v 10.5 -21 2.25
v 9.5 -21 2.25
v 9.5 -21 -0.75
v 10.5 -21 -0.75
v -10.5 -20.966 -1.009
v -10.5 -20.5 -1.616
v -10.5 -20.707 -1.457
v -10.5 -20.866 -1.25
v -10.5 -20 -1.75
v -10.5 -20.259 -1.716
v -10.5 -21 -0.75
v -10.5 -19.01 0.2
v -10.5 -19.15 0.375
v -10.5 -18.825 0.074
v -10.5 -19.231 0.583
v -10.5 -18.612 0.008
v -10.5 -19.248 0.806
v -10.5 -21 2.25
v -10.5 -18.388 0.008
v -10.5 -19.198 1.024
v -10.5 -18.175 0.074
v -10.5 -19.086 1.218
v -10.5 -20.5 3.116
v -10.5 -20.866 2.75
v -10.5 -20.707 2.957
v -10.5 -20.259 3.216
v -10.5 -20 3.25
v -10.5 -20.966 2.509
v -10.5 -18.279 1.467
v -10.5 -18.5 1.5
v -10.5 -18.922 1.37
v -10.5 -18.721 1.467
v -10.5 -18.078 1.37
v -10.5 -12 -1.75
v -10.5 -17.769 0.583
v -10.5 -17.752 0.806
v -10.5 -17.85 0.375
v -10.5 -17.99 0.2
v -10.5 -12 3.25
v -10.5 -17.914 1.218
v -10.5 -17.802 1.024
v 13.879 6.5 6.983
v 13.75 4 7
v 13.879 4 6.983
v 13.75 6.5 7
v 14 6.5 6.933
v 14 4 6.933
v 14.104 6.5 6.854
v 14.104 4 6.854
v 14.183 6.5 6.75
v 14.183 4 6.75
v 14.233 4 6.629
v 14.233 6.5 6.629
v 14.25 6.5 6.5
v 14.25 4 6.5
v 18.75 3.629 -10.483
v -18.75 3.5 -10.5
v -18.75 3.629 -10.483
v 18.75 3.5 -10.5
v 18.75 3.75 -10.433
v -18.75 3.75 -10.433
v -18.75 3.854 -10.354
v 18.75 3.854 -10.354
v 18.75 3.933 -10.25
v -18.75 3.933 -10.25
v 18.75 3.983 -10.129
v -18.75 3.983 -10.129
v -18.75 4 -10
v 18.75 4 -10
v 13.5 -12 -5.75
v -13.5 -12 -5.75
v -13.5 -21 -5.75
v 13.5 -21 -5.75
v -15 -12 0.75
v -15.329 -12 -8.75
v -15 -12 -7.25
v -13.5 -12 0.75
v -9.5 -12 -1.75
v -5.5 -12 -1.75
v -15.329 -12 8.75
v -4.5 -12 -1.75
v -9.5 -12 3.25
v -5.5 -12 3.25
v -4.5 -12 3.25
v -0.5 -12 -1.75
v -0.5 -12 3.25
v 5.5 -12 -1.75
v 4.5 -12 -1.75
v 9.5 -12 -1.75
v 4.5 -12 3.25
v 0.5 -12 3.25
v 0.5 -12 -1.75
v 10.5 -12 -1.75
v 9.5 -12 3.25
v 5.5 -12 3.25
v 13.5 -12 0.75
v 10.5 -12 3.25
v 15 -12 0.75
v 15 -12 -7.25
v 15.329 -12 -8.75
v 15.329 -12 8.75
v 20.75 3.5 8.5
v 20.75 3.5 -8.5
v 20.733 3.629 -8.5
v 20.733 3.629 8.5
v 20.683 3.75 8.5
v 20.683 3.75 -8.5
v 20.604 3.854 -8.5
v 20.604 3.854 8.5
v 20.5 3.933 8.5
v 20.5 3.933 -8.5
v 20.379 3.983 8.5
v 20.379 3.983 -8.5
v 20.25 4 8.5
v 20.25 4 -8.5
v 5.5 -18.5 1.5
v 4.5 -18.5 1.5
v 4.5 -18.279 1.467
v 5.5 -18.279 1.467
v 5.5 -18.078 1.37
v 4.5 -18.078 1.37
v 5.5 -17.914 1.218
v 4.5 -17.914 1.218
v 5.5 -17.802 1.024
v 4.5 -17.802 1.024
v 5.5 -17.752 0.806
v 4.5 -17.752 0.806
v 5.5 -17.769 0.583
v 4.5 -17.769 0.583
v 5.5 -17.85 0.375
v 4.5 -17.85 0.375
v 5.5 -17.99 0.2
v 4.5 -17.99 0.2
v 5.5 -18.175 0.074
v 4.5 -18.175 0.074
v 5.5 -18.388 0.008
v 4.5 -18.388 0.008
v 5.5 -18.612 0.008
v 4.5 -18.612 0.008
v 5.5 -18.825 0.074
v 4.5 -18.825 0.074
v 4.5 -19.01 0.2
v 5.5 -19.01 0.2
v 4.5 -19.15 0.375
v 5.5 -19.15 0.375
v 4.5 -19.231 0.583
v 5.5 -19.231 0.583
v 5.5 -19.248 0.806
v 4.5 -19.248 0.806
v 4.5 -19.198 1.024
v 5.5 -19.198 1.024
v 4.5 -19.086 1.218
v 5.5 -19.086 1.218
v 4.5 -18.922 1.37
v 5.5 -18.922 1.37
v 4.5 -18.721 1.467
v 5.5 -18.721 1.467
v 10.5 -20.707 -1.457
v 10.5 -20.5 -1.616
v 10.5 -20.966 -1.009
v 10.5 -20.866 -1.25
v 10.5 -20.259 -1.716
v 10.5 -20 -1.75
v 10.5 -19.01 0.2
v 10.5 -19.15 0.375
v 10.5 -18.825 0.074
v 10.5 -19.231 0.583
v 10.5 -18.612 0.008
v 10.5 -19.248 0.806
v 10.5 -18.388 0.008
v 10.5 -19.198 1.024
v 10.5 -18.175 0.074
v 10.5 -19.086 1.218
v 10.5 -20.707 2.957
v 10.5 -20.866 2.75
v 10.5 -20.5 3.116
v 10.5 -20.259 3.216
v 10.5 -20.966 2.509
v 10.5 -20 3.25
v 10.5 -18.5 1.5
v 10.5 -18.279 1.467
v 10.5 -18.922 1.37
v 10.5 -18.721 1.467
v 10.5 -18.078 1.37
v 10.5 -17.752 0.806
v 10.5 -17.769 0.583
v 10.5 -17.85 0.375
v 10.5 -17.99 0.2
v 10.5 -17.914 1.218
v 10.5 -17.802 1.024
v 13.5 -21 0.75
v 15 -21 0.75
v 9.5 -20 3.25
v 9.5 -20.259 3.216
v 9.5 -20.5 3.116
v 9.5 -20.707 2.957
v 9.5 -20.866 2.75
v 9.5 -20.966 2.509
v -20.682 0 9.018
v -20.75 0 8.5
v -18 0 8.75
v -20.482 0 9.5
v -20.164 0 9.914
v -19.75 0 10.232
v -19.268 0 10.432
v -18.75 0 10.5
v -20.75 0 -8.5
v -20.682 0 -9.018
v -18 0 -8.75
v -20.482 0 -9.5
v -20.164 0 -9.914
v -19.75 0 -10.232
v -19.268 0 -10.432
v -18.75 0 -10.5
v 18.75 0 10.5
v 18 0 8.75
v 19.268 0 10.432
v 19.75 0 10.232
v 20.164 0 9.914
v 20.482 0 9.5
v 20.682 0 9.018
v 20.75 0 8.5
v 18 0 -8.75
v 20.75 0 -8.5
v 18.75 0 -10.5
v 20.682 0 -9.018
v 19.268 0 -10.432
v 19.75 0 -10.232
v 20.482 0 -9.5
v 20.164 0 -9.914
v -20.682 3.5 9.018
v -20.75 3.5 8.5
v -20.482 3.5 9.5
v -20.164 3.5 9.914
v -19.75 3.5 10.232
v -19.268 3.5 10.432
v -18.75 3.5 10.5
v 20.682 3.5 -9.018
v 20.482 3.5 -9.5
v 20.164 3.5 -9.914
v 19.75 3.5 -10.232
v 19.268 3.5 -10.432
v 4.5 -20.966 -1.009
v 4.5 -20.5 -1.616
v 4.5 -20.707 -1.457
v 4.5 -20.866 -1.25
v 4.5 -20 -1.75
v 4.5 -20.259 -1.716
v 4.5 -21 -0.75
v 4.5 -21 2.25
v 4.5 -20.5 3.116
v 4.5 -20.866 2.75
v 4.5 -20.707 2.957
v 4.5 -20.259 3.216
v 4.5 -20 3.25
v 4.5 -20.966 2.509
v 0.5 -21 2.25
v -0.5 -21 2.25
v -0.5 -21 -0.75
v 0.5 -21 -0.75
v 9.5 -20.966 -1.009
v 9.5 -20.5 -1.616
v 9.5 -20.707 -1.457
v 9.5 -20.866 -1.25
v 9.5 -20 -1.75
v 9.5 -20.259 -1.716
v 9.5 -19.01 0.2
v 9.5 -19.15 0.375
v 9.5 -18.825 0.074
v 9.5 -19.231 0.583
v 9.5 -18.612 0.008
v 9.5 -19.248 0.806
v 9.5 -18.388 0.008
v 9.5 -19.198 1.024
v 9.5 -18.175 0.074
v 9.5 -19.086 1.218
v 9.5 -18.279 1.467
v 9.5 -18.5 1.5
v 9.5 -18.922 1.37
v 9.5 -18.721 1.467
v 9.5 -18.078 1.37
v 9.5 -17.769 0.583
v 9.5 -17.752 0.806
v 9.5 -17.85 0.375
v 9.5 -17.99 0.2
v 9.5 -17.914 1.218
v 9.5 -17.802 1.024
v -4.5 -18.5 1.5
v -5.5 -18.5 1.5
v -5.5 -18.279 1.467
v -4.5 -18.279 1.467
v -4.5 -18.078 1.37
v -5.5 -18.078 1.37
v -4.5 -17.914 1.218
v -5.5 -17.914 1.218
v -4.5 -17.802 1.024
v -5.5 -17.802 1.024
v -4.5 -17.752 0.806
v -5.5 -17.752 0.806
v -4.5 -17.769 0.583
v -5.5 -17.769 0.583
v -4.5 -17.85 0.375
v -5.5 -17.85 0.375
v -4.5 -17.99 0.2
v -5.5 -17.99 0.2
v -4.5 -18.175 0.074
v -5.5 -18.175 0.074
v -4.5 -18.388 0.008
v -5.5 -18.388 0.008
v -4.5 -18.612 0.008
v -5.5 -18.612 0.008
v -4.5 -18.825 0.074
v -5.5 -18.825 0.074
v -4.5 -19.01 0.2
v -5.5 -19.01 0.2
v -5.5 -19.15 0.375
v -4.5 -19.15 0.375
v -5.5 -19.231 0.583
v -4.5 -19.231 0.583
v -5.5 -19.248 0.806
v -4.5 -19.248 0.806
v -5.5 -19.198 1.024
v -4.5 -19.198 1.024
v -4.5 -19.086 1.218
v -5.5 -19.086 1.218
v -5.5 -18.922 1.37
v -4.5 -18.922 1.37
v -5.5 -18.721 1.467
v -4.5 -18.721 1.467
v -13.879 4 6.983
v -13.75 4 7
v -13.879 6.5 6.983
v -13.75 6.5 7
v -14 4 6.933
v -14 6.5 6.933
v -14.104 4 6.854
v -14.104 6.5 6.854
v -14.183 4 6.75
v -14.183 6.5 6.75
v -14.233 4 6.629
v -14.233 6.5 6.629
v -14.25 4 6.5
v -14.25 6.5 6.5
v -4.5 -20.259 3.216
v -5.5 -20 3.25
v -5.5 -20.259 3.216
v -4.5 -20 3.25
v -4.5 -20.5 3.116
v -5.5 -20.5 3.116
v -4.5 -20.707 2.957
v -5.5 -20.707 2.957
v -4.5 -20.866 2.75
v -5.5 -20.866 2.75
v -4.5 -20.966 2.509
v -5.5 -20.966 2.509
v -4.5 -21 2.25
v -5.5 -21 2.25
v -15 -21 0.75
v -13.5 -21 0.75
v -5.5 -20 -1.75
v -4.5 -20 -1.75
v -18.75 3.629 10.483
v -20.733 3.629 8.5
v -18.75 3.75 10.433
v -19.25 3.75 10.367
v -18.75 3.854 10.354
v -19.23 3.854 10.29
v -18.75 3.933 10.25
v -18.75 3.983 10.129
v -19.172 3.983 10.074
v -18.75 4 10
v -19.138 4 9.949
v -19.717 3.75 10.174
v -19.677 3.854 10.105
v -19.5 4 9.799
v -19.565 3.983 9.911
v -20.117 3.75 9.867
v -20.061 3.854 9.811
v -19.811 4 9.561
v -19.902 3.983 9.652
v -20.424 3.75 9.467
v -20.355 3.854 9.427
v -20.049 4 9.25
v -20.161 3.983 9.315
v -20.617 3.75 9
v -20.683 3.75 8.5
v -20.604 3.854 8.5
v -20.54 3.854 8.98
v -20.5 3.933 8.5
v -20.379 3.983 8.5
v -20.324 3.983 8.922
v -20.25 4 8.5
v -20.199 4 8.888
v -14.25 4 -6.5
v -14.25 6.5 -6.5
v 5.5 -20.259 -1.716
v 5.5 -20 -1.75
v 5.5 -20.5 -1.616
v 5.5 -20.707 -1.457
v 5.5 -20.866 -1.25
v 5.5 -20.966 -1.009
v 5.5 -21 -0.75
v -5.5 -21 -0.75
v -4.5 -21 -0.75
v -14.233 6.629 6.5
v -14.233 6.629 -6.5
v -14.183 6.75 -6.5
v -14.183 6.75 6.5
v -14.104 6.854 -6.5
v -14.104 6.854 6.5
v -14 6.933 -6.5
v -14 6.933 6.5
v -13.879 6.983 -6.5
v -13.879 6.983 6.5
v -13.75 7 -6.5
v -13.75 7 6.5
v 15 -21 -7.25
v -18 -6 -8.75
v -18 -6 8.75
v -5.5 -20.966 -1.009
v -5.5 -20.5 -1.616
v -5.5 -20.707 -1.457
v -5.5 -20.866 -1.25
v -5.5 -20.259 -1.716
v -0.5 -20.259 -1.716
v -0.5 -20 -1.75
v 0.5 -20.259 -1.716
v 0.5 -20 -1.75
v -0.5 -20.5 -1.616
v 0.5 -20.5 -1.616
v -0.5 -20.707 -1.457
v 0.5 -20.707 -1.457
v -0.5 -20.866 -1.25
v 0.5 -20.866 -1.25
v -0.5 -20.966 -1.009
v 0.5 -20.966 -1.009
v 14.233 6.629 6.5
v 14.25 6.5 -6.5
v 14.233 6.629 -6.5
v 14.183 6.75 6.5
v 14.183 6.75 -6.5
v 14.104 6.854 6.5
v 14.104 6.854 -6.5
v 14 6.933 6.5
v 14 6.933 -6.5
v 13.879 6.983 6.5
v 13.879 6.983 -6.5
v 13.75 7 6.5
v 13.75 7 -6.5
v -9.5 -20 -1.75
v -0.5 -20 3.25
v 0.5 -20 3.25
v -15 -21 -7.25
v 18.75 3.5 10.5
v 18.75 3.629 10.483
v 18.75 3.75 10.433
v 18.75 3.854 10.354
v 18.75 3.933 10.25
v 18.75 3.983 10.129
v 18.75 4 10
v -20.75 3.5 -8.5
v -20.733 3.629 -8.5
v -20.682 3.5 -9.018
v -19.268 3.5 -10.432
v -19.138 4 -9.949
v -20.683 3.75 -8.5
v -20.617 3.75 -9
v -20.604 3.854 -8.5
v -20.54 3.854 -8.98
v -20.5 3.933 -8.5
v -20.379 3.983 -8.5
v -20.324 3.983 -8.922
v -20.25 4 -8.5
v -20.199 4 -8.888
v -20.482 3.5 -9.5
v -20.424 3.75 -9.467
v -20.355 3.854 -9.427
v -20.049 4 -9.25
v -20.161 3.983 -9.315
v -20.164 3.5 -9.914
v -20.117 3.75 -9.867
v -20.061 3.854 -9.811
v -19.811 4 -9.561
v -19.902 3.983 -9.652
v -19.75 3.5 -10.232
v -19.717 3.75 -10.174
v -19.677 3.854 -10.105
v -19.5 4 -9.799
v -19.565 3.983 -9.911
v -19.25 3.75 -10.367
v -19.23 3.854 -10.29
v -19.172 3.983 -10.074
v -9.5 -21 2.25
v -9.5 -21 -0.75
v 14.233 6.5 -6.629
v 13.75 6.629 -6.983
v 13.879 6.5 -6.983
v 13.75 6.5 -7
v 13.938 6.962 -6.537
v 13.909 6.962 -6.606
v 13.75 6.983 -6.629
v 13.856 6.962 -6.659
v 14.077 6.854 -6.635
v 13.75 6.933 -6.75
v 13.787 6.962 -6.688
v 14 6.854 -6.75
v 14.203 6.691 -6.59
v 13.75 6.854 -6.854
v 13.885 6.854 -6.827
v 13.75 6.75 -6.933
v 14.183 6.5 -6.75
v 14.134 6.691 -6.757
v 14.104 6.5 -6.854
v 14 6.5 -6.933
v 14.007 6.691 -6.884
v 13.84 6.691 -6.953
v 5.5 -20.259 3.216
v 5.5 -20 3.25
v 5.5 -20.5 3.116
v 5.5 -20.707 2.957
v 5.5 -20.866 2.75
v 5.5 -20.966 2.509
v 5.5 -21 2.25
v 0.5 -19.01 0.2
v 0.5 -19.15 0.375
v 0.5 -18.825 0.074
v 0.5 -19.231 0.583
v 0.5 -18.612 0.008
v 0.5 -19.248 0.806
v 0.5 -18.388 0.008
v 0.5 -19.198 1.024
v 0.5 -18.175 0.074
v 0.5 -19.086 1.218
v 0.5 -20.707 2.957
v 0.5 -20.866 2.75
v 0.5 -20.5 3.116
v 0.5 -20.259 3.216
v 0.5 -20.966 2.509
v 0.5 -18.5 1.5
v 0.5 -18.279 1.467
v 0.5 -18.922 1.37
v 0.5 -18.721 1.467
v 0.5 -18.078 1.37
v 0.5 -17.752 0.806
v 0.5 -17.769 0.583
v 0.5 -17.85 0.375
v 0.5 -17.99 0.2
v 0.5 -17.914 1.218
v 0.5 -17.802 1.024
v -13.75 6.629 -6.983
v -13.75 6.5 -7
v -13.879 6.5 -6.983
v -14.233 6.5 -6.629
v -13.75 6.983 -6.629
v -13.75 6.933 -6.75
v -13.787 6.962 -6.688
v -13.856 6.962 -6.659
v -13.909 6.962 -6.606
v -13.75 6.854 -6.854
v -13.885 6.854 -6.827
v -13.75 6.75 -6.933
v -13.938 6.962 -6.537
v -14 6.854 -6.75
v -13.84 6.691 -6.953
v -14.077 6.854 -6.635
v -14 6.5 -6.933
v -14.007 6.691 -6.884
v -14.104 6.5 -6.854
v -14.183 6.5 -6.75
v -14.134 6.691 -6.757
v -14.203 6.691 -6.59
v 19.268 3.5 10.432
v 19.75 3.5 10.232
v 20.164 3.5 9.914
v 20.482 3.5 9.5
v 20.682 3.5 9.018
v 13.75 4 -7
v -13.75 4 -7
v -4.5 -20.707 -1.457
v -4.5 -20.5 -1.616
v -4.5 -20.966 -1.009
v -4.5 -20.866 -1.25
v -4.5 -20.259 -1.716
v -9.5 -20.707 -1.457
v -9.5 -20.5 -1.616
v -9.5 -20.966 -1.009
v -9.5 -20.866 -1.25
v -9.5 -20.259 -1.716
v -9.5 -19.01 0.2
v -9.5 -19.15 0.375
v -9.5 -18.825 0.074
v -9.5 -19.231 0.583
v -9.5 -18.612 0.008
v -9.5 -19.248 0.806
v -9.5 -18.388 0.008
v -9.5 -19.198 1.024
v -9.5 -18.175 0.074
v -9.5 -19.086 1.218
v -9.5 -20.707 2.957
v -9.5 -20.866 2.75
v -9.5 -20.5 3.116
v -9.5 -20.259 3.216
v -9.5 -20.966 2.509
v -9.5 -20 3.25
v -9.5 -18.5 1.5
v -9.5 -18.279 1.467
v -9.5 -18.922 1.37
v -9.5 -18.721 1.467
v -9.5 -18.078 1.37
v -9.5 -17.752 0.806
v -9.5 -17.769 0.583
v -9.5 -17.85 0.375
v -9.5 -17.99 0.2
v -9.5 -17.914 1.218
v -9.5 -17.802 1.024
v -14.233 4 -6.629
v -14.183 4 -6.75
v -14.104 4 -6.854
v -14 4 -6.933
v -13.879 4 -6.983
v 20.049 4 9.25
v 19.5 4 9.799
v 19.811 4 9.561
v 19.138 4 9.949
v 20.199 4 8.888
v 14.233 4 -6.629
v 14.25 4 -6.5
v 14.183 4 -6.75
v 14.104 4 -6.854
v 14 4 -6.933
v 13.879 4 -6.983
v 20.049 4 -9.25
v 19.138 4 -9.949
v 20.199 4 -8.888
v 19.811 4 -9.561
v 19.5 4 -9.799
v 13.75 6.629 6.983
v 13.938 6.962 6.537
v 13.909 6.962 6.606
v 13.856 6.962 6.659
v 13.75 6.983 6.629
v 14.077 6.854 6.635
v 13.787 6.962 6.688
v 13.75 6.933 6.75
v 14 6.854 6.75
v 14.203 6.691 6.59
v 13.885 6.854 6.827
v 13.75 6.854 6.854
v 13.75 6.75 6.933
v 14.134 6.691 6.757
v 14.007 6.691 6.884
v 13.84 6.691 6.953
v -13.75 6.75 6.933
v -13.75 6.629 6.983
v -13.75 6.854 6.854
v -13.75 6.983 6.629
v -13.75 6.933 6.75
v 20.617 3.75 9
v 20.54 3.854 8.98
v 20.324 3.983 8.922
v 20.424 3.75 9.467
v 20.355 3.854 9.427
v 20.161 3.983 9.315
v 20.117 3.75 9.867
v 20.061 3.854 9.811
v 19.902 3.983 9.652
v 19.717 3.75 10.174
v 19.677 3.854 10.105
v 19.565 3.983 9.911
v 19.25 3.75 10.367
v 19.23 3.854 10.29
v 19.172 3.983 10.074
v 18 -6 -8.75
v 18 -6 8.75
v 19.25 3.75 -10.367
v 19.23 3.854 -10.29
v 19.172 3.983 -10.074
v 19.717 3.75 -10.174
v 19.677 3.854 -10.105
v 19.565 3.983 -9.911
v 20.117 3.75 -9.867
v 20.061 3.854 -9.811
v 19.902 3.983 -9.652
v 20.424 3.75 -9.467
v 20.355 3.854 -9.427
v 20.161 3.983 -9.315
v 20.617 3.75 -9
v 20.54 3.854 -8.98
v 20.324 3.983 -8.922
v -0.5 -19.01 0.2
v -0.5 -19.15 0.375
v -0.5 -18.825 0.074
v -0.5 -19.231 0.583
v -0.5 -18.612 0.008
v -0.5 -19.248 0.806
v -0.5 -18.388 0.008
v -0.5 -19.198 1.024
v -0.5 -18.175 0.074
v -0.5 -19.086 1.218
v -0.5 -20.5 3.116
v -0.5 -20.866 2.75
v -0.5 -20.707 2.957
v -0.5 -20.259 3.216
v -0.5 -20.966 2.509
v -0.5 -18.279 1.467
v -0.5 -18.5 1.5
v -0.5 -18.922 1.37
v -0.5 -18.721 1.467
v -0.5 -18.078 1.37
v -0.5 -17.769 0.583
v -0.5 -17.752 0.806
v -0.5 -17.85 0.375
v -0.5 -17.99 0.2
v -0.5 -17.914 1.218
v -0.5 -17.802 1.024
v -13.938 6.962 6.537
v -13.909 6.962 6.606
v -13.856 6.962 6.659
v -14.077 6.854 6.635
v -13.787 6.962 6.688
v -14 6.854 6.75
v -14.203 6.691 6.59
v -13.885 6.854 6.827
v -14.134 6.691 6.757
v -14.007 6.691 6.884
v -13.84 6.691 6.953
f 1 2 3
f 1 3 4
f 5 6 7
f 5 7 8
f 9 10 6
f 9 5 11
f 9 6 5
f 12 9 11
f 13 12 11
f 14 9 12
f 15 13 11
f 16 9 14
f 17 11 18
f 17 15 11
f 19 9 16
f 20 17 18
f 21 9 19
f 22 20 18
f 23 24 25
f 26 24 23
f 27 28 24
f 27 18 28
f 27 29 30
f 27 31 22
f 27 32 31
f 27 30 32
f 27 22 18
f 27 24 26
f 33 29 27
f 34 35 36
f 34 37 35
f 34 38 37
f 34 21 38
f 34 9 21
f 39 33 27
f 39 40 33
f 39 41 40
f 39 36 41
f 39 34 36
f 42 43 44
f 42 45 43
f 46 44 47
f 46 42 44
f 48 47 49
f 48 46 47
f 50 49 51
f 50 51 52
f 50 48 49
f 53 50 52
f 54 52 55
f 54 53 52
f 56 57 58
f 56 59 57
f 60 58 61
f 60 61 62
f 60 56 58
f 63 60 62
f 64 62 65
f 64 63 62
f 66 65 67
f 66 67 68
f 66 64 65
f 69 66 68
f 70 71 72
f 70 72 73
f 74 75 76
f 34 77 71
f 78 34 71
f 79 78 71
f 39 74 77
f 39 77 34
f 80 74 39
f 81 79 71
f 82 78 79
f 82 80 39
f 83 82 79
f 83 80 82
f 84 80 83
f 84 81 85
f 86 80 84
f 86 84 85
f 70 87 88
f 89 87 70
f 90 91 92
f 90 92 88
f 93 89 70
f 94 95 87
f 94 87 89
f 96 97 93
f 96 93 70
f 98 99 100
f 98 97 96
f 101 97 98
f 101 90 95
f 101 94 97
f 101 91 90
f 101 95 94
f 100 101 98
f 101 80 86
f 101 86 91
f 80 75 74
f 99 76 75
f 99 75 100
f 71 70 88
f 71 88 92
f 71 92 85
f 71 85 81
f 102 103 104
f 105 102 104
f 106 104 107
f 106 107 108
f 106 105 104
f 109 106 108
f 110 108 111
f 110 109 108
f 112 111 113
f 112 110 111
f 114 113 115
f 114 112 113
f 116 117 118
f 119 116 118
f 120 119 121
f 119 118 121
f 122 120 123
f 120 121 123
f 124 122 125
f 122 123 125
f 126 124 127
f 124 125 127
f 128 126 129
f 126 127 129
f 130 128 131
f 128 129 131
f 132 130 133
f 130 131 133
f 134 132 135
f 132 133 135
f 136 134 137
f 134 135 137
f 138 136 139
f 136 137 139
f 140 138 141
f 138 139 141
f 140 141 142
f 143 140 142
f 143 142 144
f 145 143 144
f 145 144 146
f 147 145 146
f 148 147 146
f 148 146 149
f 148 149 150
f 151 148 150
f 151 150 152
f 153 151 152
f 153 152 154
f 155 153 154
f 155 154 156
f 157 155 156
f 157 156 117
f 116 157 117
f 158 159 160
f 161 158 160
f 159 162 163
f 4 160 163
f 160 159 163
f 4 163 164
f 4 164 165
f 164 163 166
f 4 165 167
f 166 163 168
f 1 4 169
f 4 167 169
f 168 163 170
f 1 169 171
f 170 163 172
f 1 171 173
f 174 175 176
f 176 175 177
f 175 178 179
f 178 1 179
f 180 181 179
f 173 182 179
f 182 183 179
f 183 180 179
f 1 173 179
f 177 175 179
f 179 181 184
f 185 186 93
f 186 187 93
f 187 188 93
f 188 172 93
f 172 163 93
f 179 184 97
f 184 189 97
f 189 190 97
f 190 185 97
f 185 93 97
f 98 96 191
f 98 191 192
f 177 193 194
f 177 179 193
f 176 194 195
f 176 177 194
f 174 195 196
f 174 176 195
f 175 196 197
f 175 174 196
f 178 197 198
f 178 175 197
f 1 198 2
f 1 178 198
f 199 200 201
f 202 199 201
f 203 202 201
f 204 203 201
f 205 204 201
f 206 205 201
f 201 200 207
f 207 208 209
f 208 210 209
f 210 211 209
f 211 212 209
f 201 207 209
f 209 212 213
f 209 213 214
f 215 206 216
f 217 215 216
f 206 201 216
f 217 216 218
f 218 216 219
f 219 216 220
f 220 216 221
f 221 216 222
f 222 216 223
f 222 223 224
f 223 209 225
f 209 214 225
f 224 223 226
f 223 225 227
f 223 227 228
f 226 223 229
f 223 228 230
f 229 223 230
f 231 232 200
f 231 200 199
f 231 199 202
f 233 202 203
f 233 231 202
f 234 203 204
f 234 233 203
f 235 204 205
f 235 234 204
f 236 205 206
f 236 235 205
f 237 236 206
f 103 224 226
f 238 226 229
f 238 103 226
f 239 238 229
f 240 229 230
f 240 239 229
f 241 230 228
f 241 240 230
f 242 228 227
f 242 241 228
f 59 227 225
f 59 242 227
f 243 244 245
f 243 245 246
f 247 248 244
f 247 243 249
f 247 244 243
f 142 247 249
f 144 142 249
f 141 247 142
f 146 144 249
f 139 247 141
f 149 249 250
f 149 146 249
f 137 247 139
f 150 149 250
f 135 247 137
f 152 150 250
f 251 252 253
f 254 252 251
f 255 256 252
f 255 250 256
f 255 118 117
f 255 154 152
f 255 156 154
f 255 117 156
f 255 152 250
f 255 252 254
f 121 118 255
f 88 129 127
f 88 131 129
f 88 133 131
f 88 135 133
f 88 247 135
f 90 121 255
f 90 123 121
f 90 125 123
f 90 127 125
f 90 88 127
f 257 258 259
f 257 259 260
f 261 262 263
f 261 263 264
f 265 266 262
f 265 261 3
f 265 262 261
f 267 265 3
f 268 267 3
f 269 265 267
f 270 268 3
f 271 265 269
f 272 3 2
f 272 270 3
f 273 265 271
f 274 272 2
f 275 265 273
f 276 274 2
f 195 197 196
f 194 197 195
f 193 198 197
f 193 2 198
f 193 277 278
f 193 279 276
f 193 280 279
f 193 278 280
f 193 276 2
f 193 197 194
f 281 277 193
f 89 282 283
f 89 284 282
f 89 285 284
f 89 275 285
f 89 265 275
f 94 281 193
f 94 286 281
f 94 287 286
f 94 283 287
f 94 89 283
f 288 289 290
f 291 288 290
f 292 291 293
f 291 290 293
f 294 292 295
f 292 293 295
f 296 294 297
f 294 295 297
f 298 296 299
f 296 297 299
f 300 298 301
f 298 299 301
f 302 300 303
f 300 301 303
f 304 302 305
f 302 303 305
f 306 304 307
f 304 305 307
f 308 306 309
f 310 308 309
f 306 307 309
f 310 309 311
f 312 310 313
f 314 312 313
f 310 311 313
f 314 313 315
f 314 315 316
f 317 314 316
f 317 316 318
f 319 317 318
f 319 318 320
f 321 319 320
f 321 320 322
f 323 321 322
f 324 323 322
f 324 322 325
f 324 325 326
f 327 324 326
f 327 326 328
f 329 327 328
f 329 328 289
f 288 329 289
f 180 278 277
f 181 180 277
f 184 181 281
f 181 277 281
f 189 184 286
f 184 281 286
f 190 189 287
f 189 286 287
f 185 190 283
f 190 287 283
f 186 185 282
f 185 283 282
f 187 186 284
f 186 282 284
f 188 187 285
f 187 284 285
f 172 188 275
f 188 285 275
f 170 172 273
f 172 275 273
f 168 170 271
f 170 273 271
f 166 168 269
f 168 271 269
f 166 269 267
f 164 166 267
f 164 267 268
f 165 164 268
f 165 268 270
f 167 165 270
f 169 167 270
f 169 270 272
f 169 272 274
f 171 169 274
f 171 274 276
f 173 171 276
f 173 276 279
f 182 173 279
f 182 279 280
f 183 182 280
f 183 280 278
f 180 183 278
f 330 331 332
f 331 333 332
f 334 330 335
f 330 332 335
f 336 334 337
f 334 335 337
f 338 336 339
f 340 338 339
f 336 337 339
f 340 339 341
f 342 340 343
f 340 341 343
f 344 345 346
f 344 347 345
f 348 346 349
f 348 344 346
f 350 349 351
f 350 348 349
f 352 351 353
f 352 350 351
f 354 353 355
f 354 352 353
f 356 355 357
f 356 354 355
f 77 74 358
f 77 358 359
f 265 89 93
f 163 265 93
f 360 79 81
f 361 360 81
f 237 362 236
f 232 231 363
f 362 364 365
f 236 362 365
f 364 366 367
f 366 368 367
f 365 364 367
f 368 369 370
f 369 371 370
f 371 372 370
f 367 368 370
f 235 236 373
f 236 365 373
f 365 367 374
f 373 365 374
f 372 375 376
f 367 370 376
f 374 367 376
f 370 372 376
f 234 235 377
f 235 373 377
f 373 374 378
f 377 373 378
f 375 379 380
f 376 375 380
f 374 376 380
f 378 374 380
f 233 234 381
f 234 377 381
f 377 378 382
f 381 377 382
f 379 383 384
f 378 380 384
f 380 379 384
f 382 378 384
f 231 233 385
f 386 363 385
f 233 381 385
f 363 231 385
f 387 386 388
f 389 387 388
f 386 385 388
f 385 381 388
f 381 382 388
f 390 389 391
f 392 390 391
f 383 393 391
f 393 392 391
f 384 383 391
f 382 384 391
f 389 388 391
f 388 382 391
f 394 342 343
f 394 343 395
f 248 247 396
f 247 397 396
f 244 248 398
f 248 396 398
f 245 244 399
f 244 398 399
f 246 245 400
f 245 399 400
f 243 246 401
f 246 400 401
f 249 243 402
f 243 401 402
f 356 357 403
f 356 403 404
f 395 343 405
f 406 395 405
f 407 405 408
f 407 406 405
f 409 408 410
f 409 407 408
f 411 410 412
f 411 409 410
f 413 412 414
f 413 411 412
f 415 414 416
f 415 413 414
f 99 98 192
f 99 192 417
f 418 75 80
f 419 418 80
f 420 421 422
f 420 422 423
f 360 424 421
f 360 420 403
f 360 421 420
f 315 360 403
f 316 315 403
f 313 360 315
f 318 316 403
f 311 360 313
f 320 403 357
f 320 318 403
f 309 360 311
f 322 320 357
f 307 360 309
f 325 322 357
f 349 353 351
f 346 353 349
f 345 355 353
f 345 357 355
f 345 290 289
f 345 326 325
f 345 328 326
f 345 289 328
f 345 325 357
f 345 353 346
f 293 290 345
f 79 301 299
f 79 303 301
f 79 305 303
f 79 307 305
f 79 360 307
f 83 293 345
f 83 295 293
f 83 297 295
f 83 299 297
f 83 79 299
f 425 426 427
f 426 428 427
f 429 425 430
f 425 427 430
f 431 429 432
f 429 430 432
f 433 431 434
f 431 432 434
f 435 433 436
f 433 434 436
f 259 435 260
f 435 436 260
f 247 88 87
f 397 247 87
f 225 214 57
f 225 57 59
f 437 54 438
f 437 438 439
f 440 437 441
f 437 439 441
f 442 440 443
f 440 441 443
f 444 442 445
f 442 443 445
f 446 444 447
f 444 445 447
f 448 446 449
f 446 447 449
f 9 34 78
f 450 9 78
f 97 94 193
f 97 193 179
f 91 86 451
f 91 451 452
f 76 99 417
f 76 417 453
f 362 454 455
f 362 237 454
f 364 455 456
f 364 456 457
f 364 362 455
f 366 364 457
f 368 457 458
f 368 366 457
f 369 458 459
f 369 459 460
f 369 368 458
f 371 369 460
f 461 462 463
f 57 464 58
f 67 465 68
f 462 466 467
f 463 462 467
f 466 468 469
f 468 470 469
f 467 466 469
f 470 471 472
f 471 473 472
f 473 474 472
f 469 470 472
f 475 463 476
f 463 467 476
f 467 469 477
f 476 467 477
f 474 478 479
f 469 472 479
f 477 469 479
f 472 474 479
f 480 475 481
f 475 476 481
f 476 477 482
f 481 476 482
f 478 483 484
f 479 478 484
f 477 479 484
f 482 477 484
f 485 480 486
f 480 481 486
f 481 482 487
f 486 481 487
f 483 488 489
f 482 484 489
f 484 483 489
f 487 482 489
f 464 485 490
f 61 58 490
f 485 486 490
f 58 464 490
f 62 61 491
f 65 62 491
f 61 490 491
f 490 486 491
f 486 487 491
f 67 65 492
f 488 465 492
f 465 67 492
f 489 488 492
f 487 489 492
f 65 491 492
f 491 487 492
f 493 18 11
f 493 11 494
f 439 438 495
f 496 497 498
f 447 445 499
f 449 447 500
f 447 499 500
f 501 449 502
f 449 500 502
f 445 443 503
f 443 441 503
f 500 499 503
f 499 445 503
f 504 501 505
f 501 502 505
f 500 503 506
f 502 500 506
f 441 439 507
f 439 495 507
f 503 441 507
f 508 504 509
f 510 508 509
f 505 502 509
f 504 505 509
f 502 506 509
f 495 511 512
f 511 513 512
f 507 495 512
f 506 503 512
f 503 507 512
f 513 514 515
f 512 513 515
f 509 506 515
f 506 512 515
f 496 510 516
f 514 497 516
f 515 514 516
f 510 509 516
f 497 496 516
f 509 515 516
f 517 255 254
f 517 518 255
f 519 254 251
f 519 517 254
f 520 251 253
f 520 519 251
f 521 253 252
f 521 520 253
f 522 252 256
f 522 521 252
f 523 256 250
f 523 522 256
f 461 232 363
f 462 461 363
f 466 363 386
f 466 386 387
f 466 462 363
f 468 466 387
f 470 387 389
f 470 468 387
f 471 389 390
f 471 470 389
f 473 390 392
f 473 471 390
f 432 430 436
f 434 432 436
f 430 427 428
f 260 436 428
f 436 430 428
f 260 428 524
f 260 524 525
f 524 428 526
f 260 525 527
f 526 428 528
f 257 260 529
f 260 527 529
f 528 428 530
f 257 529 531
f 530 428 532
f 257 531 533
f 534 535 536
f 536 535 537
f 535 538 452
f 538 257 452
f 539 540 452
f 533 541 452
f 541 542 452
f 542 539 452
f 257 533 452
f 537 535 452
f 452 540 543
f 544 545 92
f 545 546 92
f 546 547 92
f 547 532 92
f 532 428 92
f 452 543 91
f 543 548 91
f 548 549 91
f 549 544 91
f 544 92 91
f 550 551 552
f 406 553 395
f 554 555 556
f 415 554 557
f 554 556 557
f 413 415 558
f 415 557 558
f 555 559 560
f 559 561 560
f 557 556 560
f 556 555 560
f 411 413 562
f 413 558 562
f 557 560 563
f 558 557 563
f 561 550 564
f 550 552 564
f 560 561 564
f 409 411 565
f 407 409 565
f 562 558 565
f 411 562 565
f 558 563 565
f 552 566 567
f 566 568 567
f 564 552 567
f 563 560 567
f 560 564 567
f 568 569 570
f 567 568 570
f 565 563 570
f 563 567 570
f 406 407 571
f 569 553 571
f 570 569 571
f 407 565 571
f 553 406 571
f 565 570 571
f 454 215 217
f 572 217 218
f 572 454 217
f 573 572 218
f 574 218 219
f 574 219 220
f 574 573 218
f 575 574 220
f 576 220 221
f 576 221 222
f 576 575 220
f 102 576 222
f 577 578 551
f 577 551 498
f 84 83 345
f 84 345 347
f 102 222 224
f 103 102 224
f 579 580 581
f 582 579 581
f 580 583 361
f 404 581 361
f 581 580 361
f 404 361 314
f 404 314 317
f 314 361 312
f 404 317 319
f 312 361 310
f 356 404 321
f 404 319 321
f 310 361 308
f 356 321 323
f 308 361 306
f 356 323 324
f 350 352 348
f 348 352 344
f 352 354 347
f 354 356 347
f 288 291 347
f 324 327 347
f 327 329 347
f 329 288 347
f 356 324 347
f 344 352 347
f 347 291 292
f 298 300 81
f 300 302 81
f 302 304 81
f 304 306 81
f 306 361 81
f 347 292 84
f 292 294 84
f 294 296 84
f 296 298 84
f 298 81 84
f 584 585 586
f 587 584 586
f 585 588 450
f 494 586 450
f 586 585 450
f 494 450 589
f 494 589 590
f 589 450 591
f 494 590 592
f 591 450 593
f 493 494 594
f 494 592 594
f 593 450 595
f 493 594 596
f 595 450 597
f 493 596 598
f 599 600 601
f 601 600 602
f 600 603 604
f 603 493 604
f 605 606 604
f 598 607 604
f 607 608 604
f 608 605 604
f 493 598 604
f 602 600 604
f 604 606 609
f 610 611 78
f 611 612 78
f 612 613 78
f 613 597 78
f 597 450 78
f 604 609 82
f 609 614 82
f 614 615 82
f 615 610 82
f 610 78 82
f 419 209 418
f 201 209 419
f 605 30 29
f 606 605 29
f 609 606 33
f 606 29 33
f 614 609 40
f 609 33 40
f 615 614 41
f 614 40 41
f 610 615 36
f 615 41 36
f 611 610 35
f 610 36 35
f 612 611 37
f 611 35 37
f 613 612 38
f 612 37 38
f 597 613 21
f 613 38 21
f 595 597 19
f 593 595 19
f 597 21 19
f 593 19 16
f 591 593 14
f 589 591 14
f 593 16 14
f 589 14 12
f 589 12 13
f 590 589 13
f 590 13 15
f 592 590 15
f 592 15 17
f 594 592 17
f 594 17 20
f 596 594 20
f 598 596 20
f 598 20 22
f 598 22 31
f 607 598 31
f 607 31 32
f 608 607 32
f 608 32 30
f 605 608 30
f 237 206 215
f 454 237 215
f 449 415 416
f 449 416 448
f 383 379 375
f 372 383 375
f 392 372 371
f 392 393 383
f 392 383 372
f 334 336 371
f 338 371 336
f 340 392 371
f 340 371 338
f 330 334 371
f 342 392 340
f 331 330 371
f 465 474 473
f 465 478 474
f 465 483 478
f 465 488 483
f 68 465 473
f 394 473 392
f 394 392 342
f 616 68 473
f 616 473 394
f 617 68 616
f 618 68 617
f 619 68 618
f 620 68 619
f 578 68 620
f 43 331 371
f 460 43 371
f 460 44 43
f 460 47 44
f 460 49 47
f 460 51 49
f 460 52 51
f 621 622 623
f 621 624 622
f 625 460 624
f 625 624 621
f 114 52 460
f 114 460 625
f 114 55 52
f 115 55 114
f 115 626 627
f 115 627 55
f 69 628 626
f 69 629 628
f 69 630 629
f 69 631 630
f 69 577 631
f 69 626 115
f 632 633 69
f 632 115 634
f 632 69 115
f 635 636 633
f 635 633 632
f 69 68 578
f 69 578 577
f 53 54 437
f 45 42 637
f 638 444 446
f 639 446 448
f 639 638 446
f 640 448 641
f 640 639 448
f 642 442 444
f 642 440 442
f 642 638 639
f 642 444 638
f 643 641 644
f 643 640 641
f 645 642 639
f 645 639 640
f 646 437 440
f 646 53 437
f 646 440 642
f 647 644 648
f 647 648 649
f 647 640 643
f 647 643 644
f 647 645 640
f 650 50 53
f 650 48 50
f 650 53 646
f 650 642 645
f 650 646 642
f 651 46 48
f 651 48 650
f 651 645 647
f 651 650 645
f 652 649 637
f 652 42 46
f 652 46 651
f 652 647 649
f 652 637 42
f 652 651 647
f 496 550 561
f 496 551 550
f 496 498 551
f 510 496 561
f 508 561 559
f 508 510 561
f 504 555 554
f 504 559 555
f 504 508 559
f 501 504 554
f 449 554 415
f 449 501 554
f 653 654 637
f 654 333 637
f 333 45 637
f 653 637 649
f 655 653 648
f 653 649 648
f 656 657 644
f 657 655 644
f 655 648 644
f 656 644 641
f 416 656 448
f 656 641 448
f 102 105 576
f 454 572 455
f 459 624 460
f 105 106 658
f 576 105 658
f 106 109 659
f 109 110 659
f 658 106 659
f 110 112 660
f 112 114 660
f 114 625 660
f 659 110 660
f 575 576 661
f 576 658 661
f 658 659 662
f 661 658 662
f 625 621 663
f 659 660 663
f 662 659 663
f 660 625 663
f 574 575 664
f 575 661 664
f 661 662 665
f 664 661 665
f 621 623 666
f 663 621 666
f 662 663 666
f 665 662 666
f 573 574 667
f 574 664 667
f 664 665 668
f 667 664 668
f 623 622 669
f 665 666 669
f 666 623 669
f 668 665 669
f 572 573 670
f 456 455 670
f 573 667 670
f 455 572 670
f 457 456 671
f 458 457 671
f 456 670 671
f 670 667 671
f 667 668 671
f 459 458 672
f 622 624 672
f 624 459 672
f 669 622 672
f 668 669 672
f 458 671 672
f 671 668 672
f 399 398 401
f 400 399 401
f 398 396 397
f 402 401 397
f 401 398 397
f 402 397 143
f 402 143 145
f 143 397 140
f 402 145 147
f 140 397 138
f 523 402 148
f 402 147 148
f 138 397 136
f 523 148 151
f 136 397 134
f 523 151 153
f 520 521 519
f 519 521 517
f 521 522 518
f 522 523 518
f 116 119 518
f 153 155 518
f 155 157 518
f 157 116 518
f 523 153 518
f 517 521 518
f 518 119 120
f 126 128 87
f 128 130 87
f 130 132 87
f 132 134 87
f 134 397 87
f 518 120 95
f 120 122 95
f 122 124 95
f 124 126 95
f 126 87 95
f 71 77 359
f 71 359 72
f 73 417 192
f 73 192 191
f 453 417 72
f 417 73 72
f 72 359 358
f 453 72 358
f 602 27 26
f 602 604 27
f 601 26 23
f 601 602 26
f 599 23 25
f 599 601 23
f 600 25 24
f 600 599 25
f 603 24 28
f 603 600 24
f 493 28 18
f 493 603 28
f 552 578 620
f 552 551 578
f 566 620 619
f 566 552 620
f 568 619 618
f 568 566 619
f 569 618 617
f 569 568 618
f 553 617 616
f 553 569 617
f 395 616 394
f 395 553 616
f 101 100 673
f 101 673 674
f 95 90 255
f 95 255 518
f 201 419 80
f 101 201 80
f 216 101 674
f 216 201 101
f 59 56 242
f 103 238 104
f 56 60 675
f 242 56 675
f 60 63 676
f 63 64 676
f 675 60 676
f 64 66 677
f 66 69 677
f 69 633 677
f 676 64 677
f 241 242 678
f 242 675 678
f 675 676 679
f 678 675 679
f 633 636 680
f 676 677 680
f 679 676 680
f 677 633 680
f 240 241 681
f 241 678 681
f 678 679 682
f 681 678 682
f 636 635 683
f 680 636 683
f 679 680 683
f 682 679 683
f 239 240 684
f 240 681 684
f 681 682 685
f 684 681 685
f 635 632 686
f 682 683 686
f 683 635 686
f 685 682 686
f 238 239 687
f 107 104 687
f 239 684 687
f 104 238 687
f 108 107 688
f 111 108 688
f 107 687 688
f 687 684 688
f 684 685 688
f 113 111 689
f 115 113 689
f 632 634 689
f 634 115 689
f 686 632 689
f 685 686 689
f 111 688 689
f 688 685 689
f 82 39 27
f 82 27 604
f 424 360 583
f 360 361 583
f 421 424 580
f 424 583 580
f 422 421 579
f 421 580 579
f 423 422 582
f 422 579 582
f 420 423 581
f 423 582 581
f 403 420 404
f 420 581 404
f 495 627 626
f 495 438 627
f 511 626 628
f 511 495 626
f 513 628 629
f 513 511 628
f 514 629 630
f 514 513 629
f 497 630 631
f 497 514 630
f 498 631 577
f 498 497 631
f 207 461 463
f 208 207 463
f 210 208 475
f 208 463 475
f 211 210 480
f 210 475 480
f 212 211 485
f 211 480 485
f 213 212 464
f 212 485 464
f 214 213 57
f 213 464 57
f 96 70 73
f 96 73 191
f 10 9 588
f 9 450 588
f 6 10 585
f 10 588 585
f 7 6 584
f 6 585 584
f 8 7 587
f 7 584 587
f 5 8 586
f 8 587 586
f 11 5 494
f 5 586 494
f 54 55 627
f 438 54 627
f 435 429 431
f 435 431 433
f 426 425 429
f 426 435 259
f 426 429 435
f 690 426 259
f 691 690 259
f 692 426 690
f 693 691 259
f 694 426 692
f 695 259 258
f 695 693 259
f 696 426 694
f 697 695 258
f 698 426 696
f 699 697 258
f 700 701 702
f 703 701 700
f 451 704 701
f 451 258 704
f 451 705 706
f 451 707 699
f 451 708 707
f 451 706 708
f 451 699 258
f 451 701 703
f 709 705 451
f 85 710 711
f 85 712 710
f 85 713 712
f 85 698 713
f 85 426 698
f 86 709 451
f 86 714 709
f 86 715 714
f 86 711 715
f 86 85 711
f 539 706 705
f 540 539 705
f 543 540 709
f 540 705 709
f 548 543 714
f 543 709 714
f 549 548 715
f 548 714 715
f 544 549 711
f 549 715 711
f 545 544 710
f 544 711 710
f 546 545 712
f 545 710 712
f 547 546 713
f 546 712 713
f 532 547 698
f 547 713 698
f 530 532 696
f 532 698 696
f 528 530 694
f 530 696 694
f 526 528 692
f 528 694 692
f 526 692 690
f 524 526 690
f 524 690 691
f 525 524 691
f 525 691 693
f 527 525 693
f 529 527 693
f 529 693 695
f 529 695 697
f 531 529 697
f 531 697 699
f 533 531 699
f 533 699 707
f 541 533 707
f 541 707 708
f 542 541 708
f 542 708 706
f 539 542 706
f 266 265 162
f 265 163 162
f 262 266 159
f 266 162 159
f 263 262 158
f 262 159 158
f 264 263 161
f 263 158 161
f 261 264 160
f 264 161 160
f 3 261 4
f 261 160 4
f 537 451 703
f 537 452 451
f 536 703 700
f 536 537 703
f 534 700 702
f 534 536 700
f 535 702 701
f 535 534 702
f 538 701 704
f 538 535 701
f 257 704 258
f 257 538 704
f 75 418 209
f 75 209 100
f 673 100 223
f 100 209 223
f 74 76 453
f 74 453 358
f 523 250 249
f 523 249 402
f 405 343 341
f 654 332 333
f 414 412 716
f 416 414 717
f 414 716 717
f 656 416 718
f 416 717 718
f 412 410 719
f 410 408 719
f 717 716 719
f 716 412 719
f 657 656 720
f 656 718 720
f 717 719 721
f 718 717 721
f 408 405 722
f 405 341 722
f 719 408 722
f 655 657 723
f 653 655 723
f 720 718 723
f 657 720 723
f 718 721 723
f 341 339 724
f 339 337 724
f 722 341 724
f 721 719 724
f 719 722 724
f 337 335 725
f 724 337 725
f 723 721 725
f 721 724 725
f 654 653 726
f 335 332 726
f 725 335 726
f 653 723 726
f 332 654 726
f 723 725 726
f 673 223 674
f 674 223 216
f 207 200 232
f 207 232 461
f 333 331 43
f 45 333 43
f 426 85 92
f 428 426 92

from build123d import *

# Parameters (mm, degrees)
SKETCH_1_W             = 41.5
SKETCH_1_H             = 21
EXTRUDE_1_DEPTH        = 4
FILLET_1_R             = 2
FILLET_2_R             = 0.5
SKETCH_2_W             = 28.5
SKETCH_2_H             = 14
EXTRUDE_2_DEPTH        = 3
FILLET_3_R             = 0.5
SKETCH_3_W             = 36
SKETCH_3_H             = 17.5
EXTRUDE_3_DEPTH        = 12
CHAMFER_1_SIZE         = 6
CHAMFER_1_SIZE2        = 2.671372112
CHAMFER_1_PART_2_SIZE  = 6
CHAMFER_1_PART_2_SIZE2 = 2.671372112
SKETCH_4_W             = 1
SKETCH_4_H             = 5
EXTRUDE_4_DEPTH        = 9
FILLET_4_R             = 1
SKETCH_5_R             = 0.75
CUT_EXTRUDE_1_DEPTH    = 21


with BuildPart() as part:
    # Эскиз1 → Бобышка-Вытянуть1 (new body)
    with BuildSketch(Plane(origin=(0, 0, 0), x_dir=(1, 0, 0), z_dir=(0, 1, 0))):
        Rectangle(SKETCH_1_W, SKETCH_1_H)
    extrude(amount=EXTRUDE_1_DEPTH)

    # Скругление1
    fillet_1_edges = [part.edges().sort_by_distance(p)[0] for p in [
        (20.75, 2, 10.5),
        (-20.75, 2, 10.5),
        (-20.75, 2, -10.5),
        (20.75, 2, -10.5),
    ]]
    fillet(fillet_1_edges, radius=FILLET_1_R)

    # Скругление2
    fillet_2_edges = [part.edges().sort_by_distance(p)[0] for p in [
        (-20.75, 4, 0),
        (0, 4, -10.5),
        (20.75, 4, 0),
        (0, 4, 10.5),
        (-20.164213562, 4, 9.914213562),
        (20.164213562, 4, 9.914213562),
        (20.164213562, 4, -9.914213562),
        (-20.164213562, 4, -9.914213562),
    ]]
    fillet(fillet_2_edges, radius=FILLET_2_R)

    # Эскиз2 → Бобышка-Вытянуть2 (add)
    with BuildSketch(Plane(origin=(0, 4, 0), x_dir=(1, 0, 0), z_dir=(0, 1, 0))):
        Rectangle(SKETCH_2_W, SKETCH_2_H)
    extrude(amount=EXTRUDE_2_DEPTH)

    # Скругление3
    fillet_3_edges = [part.edges().sort_by_distance(p)[0] for p in [
        (14.25, 5.5, 7),
        (14.25, 5.5, -7),
        (-14.25, 5.5, -7),
        (-14.25, 5.5, 7),
        (14.25, 7, 0),
        (0, 7, -7),
        (-14.25, 7, 0),
        (0, 7, 7),
    ]]
    fillet(fillet_3_edges, radius=FILLET_3_R)

    # Эскиз3 → Бобышка-Вытянуть3 (add)
    with BuildSketch(Plane.XZ):
        Rectangle(SKETCH_3_W, SKETCH_3_H)
    extrude(amount=EXTRUDE_3_DEPTH)

    # Фаска1
    chamfer_1_edges = [part.edges().sort_by_distance(p)[0] for p in [
        (18, -12, 0),
    ]]
    chamfer_1_side = [part.faces().sort_by_distance(p)[0] for p in [
        (18, -6, 0),
    ]]
    chamfer(chamfer_1_edges, length=CHAMFER_1_SIZE, length2=CHAMFER_1_SIZE2, reference=chamfer_1_side[0])

    # Фаска1 part 2
    chamfer_1_part_2_edges = [part.edges().sort_by_distance(p)[0] for p in [
        (-18, -12, 0),
    ]]
    chamfer_1_part_2_side = [part.faces().sort_by_distance(p)[0] for p in [
        (-18, -6, 0),
    ]]
    chamfer(chamfer_1_part_2_edges, length=CHAMFER_1_PART_2_SIZE, length2=CHAMFER_1_PART_2_SIZE2, reference=chamfer_1_part_2_side[0])

    # Эскиз4 → Бобышка-Вытянуть4 (add)
    with BuildSketch(Plane.XZ.offset(12)):
        Polygon((13.5, 0.75), (15, 0.75), (15, -7.25), (-15, -7.25), (-15, 0.75), (-13.5, 0.75), (-13.5, -5.75), (13.5, -5.75), align=None)
        with Locations((5, 0.75)):
            Rectangle(SKETCH_4_W, SKETCH_4_H)
        with Locations((0, 0.75)):
            Rectangle(SKETCH_4_W, SKETCH_4_H)
        with Locations((10, 0.75)):
            Rectangle(SKETCH_4_W, SKETCH_4_H)
        with Locations((-5, 0.75)):
            Rectangle(SKETCH_4_W, SKETCH_4_H)
        with Locations((-10, 0.75)):
            Rectangle(SKETCH_4_W, SKETCH_4_H)
    extrude(amount=EXTRUDE_4_DEPTH)

    # Скругление4
    fillet_4_edges = [part.edges().sort_by_distance(p)[0] for p in [
        (5, -21, -1.75),
        (5, -21, 3.25),
        (0, -21, 3.25),
        (0, -21, -1.75),
        (10, -21, -1.75),
        (10, -21, 3.25),
        (-5, -21, -1.75),
        (-5, -21, 3.25),
        (-10, -21, -1.75),
        (-10, -21, 3.25),
    ]]
    fillet(fillet_4_edges, radius=FILLET_4_R)

    # Эскиз5 → Вырез-Вытянуть1 (cut)
    with BuildSketch(Plane.ZY.offset(10.5)):
        with Locations((0.75, -18.5)):
            Circle(SKETCH_5_R)
    extrude(amount=-CUT_EXTRUDE_1_DEPTH, mode=Mode.SUBTRACT)


solid = part.part
